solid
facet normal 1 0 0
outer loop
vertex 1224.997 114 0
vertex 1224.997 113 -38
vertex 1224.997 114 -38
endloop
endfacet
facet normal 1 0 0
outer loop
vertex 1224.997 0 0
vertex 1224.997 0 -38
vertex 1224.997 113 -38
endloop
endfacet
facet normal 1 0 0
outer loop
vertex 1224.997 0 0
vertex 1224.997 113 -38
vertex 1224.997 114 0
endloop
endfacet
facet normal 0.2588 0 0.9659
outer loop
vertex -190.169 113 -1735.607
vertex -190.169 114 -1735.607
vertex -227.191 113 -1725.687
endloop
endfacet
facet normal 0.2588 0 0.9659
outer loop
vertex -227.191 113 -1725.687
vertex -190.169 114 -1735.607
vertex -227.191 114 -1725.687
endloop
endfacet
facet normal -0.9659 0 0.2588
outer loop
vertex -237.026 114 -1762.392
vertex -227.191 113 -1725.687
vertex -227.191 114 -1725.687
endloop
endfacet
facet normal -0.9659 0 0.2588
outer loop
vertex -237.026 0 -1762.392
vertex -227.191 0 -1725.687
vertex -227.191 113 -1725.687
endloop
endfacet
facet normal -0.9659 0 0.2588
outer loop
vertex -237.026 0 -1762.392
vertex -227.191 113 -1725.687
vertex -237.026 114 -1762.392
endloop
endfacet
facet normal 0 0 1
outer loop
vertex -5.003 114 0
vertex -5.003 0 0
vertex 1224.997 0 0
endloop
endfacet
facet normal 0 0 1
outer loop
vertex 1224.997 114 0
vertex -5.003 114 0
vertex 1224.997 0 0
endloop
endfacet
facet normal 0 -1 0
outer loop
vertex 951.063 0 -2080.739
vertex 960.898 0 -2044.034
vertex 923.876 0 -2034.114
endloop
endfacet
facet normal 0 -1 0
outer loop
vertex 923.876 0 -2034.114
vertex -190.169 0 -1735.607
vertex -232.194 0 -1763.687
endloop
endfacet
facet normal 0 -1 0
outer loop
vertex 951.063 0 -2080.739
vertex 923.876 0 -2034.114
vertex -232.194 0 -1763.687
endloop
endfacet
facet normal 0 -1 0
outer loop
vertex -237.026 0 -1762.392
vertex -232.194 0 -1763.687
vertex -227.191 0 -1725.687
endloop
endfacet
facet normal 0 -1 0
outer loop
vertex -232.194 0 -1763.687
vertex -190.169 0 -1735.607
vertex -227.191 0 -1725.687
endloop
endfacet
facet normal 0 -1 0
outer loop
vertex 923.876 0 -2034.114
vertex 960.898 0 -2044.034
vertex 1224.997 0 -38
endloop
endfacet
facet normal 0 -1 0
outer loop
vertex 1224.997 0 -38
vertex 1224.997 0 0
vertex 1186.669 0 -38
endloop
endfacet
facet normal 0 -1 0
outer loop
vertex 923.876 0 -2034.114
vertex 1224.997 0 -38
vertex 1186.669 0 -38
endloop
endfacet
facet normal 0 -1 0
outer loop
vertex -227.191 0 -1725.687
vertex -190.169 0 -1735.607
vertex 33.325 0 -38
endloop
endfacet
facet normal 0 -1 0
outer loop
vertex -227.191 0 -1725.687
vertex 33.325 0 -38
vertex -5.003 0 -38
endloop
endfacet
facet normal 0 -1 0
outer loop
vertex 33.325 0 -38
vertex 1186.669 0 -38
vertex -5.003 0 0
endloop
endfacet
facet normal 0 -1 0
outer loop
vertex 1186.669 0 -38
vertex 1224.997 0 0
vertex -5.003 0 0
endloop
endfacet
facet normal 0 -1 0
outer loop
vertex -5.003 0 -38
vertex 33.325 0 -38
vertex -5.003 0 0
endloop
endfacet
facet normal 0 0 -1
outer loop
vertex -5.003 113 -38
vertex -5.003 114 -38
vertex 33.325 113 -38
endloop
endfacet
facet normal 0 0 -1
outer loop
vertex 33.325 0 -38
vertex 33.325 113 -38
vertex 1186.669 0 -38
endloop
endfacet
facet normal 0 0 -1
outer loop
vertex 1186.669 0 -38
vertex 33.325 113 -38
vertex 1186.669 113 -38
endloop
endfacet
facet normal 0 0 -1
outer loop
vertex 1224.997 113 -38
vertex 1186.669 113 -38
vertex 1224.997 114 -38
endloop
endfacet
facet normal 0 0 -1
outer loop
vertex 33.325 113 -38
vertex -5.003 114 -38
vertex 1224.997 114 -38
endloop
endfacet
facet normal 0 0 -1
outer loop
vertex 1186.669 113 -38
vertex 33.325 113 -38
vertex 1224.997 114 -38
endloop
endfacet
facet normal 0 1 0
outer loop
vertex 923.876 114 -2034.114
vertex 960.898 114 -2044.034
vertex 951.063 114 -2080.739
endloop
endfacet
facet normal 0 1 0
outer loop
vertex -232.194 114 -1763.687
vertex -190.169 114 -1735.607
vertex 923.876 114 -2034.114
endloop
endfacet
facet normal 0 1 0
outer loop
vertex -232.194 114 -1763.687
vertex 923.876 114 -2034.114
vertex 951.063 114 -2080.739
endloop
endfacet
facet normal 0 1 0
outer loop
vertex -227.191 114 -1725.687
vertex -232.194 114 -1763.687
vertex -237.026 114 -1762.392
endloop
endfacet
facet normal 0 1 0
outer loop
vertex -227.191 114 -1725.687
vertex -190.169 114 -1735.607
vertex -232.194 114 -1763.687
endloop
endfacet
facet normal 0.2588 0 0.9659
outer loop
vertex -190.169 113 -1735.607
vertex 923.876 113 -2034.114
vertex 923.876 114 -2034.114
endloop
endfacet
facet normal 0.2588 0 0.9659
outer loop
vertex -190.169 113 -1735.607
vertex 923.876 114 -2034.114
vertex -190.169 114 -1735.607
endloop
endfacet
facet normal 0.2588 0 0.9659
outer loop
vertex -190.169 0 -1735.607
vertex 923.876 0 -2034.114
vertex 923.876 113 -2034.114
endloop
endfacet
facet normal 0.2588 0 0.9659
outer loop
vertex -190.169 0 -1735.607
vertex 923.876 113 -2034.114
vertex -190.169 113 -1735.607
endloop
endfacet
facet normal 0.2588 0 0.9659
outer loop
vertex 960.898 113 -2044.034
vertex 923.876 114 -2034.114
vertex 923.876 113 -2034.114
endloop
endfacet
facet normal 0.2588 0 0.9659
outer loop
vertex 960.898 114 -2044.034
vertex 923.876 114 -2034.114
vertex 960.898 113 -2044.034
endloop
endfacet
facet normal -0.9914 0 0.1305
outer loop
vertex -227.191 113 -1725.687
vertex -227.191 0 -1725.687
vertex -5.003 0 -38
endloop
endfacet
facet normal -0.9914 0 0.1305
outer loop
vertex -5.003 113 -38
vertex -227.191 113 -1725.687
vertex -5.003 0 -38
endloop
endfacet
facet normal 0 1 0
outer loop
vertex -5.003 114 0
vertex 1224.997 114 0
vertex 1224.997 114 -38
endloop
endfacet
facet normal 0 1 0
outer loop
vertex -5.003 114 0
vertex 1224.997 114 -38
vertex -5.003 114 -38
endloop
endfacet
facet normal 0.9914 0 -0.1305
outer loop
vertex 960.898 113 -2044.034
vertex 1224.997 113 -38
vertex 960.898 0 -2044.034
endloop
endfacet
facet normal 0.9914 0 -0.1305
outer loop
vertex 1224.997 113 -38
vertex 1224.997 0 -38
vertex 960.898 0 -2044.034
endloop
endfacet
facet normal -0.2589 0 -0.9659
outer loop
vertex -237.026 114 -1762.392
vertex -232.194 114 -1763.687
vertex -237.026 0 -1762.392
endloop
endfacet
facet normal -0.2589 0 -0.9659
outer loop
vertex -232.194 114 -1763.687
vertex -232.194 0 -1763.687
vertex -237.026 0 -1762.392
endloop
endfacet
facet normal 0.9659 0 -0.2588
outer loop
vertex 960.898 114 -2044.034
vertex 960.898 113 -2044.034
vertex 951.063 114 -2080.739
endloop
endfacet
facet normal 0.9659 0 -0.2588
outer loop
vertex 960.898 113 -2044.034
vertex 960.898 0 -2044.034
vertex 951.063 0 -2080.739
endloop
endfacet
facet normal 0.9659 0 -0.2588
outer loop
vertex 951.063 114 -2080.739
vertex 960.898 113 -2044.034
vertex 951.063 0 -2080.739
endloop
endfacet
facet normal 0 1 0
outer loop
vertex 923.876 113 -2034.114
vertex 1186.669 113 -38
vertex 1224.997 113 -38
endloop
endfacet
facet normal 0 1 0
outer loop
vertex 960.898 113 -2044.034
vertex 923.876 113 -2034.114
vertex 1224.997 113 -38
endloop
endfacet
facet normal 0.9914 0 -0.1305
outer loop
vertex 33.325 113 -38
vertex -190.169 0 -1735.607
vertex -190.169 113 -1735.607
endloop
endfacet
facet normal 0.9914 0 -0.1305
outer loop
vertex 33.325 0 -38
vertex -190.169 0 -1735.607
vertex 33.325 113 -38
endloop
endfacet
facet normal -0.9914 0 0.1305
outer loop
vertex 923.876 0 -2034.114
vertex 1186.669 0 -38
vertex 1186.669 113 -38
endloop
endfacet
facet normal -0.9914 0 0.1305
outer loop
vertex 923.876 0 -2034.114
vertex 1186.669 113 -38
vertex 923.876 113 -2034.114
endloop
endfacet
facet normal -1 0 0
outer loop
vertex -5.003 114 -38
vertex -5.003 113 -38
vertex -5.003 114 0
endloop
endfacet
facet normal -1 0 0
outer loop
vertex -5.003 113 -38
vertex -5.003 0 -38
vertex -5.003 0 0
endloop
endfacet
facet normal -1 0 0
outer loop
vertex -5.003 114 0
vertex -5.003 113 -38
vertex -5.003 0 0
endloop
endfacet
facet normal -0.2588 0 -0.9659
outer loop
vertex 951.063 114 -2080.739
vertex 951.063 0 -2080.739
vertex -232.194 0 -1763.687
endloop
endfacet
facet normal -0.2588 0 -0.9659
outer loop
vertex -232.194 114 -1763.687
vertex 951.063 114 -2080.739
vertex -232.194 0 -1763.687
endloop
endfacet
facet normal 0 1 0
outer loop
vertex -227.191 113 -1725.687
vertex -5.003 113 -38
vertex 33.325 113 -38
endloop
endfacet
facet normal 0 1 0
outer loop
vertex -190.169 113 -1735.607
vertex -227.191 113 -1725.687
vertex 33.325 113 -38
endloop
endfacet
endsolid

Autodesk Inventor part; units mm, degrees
ref_plane "YZ Plane" through (0, 0, 0) normal (1, 0, 0) x (0, 1, 0)
ref_plane "XZ Plane" through (0, 0, 0) normal (0, 1, 0) x (-1, 0, 0)
ref_plane "XY Plane" through (0, 0, 0) normal (0, 0, 1) x (1, 0, 0)
sketch "Sketch1" plane through (0, 0, 0) normal (0, 1, 0) x (-1, 0, 0)
  line L0 (-1224.9972, -38) -> (-960.8978, -2044.0342)
  line L1 (-951.0627, -2080.7394) -> (232.1938, -1763.6868)
  line L2 (-955.895, -2082.0342) -> (274.105, -2082.0342) construction
  line L3 (227.191, -1725.6868) -> (5.0028, -38)
  line L4 (190.1691, -1735.6068) -> (-33.3251, -38)
  line L5 (-33.3251, -38) -> (-1186.6693, -38)
  line L6 (-1186.6693, -38) -> (-923.8759, -2034.1142)
  line L7 (-960.8978, -2044.0342) -> (-951.0627, -2080.7394)
  line L8 (-923.8759, -2034.1142) -> (190.1691, -1735.6068)
  line L9 (-1224.9972, -38) -> (-1224.9972, 0)
  line L10 (5.0028, -38) -> (5.0028, 0)
  line L11 (-1230, 0) -> (-1224.9972, 0) construction
  line L12 (5.0028, 0) -> (870, 0) construction
  line L13 (5.0028, 0) -> (-1224.9972, 0)
  line L14 (232.1938, -1763.6868) -> (237.0261, -1762.392)
  line L15 (227.191, -1725.6868) -> (237.0261, -1762.392)
  dimension "d1" = 2100
  dimension "d9" = 1230
  dimension "d10" = 15
  dimension "d12" = 38
extrude "Extrusion1" add sketch "Sketch1" along normal blind 114
sketch "Sketch2" plane through (0, 114, 0) normal (0, 1, 0) x (1, 0, 0)
  line L0 (33.3251, 38) -> (-190.1691, 1735.6068) projected
  line L1 (-227.191, 1725.6868) -> (-5.0028, 38) projected
  line L2 (1224.9972, 0) -> (1224.9972, 38) projected
  line L3 (960.8978, 2044.0342) -> (951.0627, 2080.7394) projected
  line L4 (-190.1691, 1735.6068) -> (-227.191, 1725.6868)
  line L5 (33.3251, 38) -> (-5.0028, 38)
  point P0 (0, 0)
extrude "Extrusion2" cut sketch "Sketch2" against normal blind 1
sketch "Sketch3" plane through (0, 114, 0) normal (0, 1, 0) x (1, 0, 0)
  line L0 (1224.9972, 0) -> (1224.9972, 38) projected
  line L1 (1224.9972, 38) -> (960.8978, 2044.0342) projected
  line L2 (960.8978, 2044.0342) -> (951.0627, 2080.7394) projected
  line L3 (951.0627, 2080.7394) -> (-237.0261, 1762.392) projected
  line L4 (-237.0261, 1762.392) -> (-227.191, 1725.6868) projected
  line L5 (-227.191, 1725.6868) -> (923.8759, 2034.1142) projected
  line L6 (923.8759, 2034.1142) -> (1186.6693, 38) projected
  line L7 (1186.6693, 38) -> (1224.9972, 38)
  line L8 (923.8759, 2034.1142) -> (960.8978, 2044.0342)
  point P0 (0, 0)
extrude "Extrusion3" cut sketch "Sketch3" against normal blind 1 contours L7 L6 L8 L1
properties part number "H7jp.E_UfaA-panelEframe" material "Wood (Cherry)"
